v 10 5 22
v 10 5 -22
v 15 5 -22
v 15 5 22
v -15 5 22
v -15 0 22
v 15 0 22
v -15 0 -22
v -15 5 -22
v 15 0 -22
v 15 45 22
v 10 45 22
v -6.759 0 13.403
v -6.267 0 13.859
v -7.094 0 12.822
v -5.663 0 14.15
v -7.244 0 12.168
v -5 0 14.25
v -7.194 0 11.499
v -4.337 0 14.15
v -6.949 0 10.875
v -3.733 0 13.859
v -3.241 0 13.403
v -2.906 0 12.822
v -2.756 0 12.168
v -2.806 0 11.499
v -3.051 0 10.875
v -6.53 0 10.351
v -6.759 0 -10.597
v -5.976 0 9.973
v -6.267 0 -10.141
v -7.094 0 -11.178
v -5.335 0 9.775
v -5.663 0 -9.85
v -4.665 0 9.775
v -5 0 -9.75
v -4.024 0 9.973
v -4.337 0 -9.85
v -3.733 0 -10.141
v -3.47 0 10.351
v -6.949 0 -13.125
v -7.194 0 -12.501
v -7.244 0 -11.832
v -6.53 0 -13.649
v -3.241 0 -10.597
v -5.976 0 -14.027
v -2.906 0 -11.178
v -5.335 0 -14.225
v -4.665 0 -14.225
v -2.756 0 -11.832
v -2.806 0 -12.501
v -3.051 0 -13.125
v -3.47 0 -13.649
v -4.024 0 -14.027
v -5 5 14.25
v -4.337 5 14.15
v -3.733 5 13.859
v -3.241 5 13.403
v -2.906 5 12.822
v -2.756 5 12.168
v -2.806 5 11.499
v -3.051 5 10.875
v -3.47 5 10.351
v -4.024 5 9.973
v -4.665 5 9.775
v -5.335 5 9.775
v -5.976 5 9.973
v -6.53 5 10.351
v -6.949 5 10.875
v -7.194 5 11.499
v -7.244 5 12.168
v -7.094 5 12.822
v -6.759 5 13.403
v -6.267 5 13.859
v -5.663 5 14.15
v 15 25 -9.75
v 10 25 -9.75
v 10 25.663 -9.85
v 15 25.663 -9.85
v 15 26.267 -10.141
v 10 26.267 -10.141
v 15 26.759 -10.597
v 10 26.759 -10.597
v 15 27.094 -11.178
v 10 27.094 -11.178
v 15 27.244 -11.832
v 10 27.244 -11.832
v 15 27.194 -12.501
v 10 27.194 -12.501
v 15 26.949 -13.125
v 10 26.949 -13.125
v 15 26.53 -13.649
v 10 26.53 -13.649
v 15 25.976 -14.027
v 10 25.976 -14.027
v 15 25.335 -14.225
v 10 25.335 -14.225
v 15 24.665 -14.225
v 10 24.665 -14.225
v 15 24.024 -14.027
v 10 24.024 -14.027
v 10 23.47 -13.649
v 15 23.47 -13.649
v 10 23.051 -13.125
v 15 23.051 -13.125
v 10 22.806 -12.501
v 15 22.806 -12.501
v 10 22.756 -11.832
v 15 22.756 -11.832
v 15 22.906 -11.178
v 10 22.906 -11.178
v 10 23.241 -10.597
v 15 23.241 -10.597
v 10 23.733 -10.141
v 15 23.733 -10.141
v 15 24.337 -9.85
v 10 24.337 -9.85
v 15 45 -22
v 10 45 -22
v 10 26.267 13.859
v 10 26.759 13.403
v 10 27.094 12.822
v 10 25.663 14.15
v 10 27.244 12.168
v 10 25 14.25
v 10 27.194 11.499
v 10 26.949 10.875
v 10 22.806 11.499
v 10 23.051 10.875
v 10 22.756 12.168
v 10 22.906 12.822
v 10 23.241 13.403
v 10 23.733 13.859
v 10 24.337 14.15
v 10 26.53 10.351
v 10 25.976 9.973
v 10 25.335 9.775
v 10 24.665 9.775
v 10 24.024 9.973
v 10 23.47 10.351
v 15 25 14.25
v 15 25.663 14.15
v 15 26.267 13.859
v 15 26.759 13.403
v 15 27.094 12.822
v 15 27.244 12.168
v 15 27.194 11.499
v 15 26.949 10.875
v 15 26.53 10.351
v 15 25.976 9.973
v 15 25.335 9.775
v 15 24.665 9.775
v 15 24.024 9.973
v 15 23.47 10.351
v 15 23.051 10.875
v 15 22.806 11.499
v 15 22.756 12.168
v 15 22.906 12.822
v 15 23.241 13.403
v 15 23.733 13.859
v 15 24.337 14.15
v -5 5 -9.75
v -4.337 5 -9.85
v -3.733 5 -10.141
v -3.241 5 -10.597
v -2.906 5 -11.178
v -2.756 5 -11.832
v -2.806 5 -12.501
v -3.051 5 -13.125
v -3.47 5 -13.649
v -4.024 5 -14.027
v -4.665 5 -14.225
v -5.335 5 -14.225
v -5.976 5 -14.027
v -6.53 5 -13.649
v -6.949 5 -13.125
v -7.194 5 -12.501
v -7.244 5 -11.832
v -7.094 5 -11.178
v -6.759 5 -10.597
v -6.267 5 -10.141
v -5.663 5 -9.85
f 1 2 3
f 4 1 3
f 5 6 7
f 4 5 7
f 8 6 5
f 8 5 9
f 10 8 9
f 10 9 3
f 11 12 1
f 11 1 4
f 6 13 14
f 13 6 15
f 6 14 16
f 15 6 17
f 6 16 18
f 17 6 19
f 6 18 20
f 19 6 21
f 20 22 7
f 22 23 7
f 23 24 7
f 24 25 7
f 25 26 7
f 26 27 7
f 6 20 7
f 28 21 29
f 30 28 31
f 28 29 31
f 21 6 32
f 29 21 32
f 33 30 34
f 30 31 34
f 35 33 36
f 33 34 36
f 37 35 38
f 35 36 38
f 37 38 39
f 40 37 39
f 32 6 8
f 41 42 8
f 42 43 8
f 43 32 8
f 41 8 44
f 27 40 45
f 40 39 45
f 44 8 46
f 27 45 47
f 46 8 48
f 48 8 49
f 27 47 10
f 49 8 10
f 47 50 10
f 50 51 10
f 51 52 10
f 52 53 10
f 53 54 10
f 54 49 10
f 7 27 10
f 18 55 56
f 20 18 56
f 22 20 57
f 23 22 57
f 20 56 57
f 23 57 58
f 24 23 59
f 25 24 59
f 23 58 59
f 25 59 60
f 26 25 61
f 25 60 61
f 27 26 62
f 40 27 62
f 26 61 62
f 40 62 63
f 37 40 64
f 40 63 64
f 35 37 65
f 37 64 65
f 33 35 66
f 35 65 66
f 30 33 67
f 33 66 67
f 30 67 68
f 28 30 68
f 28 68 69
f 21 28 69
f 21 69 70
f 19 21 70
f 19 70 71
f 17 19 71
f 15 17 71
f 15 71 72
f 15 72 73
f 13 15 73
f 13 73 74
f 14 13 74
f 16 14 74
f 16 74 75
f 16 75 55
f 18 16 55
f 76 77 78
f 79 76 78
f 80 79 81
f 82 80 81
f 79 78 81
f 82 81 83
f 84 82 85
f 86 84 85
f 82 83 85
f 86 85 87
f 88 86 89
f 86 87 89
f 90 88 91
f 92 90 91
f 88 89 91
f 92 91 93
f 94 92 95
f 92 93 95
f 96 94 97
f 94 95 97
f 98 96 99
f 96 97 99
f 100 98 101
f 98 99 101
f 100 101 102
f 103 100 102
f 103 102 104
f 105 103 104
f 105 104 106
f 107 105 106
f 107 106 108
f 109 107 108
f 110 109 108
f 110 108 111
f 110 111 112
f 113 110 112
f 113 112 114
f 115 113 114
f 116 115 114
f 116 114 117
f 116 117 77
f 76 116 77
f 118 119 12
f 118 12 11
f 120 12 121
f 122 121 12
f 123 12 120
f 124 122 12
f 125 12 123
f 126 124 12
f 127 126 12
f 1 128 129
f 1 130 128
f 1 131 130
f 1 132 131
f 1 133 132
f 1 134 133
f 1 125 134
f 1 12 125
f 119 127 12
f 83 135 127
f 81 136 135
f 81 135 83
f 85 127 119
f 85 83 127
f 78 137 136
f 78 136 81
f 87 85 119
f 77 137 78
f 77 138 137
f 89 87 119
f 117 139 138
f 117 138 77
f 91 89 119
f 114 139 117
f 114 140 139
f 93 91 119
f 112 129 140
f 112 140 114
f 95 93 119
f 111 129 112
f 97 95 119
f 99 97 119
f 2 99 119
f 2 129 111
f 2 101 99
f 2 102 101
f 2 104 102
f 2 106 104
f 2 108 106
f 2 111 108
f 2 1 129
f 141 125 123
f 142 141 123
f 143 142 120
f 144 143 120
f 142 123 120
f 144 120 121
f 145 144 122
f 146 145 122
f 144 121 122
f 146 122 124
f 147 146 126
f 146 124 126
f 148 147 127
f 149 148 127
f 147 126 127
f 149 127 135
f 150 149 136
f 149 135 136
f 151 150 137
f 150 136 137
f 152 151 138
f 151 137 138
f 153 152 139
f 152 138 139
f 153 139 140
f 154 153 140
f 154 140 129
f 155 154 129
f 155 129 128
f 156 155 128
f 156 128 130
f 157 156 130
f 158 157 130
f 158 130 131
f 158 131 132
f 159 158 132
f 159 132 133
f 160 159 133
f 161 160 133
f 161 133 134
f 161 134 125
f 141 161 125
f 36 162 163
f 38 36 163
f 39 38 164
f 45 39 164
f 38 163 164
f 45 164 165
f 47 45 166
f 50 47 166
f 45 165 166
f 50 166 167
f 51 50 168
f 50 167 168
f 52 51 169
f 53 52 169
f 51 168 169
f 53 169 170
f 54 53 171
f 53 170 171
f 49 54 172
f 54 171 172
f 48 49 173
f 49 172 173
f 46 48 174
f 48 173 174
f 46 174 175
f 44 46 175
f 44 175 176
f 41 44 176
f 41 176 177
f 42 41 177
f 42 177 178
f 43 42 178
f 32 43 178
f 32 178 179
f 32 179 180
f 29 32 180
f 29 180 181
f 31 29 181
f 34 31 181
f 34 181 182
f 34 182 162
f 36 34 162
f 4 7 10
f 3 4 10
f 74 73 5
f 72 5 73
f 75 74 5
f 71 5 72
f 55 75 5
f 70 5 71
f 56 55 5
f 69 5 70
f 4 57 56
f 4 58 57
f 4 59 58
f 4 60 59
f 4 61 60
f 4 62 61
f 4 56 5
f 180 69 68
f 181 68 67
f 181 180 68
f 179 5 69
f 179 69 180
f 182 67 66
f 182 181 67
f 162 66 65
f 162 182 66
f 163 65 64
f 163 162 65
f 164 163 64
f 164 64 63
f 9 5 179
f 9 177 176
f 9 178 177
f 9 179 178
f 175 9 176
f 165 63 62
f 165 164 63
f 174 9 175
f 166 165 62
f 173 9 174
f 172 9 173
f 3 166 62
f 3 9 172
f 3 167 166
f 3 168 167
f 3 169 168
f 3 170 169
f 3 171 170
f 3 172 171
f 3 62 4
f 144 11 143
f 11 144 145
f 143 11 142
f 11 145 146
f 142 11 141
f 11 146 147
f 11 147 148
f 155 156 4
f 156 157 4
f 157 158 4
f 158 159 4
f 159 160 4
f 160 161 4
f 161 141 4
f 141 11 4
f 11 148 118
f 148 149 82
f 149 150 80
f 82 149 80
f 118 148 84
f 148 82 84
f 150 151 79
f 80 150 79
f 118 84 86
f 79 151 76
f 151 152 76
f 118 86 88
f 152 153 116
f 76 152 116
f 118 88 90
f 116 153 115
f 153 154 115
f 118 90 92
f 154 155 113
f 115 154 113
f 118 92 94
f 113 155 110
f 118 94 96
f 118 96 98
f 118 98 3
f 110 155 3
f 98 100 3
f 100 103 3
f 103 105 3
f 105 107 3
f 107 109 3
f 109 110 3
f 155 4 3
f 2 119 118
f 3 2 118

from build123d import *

# Parameters (mm, degrees)
SKETCH1_W           = 30
SKETCH1_H           = 44
BOSS_EXTRUDE1_DEPTH = 5
SKETCH2_R           = 2.25
CUT_EXTRUDE1_DEPTH  = 28.092434368
SKETCH4_W           = 5
SKETCH4_H           = 44
BOSS_EXTRUDE3_DEPTH = 40
SKETCH5_R           = 2.25
CUT_EXTRUDE3_DEPTH  = 56.982140009


with BuildPart() as part:
    # Sketch1 → Boss-Extrude1 (new body)
    with BuildSketch(Plane(origin=(0, 0, 0), x_dir=(1, 0, 0), z_dir=(0, 1, 0))):
        Rectangle(SKETCH1_W, SKETCH1_H)
    extrude(amount=BOSS_EXTRUDE1_DEPTH)

    # Sketch2 → Cut-Extrude1 (cut, through all)
    with BuildSketch(Plane(origin=(0, 5, 0), x_dir=(1, 0, 0), z_dir=(0, 1, 0))):
        with Locations(Location((-5, -12, 0), (0, 0, 270))):
            Circle(SKETCH2_R)
        with Locations(Location((-5, 12, 0), (0, 0, 270))):
            Circle(SKETCH2_R)
    extrude(amount=-CUT_EXTRUDE1_DEPTH, mode=Mode.SUBTRACT)


with BuildPart() as body_2:
    # Sketch4 → Boss-Extrude3 (new body)
    with BuildSketch(Plane(origin=(0, 5, 0), x_dir=(1, 0, 0), z_dir=(0, 1, 0))):
        with Locations((12.5, 0)):
            Rectangle(SKETCH4_W, SKETCH4_H)
    extrude(amount=BOSS_EXTRUDE3_DEPTH)

    # Sketch5 → Cut-Extrude3 (cut, through all)
    with BuildSketch(Plane.ZY.offset(-10)):
        with Locations((12, 25)):
            Circle(SKETCH5_R)
        with Locations((-12, 25)):
            Circle(SKETCH5_R)
    extrude(amount=-CUT_EXTRUDE3_DEPTH, mode=Mode.SUBTRACT)


solid = Compound([part.part, body_2.part])
